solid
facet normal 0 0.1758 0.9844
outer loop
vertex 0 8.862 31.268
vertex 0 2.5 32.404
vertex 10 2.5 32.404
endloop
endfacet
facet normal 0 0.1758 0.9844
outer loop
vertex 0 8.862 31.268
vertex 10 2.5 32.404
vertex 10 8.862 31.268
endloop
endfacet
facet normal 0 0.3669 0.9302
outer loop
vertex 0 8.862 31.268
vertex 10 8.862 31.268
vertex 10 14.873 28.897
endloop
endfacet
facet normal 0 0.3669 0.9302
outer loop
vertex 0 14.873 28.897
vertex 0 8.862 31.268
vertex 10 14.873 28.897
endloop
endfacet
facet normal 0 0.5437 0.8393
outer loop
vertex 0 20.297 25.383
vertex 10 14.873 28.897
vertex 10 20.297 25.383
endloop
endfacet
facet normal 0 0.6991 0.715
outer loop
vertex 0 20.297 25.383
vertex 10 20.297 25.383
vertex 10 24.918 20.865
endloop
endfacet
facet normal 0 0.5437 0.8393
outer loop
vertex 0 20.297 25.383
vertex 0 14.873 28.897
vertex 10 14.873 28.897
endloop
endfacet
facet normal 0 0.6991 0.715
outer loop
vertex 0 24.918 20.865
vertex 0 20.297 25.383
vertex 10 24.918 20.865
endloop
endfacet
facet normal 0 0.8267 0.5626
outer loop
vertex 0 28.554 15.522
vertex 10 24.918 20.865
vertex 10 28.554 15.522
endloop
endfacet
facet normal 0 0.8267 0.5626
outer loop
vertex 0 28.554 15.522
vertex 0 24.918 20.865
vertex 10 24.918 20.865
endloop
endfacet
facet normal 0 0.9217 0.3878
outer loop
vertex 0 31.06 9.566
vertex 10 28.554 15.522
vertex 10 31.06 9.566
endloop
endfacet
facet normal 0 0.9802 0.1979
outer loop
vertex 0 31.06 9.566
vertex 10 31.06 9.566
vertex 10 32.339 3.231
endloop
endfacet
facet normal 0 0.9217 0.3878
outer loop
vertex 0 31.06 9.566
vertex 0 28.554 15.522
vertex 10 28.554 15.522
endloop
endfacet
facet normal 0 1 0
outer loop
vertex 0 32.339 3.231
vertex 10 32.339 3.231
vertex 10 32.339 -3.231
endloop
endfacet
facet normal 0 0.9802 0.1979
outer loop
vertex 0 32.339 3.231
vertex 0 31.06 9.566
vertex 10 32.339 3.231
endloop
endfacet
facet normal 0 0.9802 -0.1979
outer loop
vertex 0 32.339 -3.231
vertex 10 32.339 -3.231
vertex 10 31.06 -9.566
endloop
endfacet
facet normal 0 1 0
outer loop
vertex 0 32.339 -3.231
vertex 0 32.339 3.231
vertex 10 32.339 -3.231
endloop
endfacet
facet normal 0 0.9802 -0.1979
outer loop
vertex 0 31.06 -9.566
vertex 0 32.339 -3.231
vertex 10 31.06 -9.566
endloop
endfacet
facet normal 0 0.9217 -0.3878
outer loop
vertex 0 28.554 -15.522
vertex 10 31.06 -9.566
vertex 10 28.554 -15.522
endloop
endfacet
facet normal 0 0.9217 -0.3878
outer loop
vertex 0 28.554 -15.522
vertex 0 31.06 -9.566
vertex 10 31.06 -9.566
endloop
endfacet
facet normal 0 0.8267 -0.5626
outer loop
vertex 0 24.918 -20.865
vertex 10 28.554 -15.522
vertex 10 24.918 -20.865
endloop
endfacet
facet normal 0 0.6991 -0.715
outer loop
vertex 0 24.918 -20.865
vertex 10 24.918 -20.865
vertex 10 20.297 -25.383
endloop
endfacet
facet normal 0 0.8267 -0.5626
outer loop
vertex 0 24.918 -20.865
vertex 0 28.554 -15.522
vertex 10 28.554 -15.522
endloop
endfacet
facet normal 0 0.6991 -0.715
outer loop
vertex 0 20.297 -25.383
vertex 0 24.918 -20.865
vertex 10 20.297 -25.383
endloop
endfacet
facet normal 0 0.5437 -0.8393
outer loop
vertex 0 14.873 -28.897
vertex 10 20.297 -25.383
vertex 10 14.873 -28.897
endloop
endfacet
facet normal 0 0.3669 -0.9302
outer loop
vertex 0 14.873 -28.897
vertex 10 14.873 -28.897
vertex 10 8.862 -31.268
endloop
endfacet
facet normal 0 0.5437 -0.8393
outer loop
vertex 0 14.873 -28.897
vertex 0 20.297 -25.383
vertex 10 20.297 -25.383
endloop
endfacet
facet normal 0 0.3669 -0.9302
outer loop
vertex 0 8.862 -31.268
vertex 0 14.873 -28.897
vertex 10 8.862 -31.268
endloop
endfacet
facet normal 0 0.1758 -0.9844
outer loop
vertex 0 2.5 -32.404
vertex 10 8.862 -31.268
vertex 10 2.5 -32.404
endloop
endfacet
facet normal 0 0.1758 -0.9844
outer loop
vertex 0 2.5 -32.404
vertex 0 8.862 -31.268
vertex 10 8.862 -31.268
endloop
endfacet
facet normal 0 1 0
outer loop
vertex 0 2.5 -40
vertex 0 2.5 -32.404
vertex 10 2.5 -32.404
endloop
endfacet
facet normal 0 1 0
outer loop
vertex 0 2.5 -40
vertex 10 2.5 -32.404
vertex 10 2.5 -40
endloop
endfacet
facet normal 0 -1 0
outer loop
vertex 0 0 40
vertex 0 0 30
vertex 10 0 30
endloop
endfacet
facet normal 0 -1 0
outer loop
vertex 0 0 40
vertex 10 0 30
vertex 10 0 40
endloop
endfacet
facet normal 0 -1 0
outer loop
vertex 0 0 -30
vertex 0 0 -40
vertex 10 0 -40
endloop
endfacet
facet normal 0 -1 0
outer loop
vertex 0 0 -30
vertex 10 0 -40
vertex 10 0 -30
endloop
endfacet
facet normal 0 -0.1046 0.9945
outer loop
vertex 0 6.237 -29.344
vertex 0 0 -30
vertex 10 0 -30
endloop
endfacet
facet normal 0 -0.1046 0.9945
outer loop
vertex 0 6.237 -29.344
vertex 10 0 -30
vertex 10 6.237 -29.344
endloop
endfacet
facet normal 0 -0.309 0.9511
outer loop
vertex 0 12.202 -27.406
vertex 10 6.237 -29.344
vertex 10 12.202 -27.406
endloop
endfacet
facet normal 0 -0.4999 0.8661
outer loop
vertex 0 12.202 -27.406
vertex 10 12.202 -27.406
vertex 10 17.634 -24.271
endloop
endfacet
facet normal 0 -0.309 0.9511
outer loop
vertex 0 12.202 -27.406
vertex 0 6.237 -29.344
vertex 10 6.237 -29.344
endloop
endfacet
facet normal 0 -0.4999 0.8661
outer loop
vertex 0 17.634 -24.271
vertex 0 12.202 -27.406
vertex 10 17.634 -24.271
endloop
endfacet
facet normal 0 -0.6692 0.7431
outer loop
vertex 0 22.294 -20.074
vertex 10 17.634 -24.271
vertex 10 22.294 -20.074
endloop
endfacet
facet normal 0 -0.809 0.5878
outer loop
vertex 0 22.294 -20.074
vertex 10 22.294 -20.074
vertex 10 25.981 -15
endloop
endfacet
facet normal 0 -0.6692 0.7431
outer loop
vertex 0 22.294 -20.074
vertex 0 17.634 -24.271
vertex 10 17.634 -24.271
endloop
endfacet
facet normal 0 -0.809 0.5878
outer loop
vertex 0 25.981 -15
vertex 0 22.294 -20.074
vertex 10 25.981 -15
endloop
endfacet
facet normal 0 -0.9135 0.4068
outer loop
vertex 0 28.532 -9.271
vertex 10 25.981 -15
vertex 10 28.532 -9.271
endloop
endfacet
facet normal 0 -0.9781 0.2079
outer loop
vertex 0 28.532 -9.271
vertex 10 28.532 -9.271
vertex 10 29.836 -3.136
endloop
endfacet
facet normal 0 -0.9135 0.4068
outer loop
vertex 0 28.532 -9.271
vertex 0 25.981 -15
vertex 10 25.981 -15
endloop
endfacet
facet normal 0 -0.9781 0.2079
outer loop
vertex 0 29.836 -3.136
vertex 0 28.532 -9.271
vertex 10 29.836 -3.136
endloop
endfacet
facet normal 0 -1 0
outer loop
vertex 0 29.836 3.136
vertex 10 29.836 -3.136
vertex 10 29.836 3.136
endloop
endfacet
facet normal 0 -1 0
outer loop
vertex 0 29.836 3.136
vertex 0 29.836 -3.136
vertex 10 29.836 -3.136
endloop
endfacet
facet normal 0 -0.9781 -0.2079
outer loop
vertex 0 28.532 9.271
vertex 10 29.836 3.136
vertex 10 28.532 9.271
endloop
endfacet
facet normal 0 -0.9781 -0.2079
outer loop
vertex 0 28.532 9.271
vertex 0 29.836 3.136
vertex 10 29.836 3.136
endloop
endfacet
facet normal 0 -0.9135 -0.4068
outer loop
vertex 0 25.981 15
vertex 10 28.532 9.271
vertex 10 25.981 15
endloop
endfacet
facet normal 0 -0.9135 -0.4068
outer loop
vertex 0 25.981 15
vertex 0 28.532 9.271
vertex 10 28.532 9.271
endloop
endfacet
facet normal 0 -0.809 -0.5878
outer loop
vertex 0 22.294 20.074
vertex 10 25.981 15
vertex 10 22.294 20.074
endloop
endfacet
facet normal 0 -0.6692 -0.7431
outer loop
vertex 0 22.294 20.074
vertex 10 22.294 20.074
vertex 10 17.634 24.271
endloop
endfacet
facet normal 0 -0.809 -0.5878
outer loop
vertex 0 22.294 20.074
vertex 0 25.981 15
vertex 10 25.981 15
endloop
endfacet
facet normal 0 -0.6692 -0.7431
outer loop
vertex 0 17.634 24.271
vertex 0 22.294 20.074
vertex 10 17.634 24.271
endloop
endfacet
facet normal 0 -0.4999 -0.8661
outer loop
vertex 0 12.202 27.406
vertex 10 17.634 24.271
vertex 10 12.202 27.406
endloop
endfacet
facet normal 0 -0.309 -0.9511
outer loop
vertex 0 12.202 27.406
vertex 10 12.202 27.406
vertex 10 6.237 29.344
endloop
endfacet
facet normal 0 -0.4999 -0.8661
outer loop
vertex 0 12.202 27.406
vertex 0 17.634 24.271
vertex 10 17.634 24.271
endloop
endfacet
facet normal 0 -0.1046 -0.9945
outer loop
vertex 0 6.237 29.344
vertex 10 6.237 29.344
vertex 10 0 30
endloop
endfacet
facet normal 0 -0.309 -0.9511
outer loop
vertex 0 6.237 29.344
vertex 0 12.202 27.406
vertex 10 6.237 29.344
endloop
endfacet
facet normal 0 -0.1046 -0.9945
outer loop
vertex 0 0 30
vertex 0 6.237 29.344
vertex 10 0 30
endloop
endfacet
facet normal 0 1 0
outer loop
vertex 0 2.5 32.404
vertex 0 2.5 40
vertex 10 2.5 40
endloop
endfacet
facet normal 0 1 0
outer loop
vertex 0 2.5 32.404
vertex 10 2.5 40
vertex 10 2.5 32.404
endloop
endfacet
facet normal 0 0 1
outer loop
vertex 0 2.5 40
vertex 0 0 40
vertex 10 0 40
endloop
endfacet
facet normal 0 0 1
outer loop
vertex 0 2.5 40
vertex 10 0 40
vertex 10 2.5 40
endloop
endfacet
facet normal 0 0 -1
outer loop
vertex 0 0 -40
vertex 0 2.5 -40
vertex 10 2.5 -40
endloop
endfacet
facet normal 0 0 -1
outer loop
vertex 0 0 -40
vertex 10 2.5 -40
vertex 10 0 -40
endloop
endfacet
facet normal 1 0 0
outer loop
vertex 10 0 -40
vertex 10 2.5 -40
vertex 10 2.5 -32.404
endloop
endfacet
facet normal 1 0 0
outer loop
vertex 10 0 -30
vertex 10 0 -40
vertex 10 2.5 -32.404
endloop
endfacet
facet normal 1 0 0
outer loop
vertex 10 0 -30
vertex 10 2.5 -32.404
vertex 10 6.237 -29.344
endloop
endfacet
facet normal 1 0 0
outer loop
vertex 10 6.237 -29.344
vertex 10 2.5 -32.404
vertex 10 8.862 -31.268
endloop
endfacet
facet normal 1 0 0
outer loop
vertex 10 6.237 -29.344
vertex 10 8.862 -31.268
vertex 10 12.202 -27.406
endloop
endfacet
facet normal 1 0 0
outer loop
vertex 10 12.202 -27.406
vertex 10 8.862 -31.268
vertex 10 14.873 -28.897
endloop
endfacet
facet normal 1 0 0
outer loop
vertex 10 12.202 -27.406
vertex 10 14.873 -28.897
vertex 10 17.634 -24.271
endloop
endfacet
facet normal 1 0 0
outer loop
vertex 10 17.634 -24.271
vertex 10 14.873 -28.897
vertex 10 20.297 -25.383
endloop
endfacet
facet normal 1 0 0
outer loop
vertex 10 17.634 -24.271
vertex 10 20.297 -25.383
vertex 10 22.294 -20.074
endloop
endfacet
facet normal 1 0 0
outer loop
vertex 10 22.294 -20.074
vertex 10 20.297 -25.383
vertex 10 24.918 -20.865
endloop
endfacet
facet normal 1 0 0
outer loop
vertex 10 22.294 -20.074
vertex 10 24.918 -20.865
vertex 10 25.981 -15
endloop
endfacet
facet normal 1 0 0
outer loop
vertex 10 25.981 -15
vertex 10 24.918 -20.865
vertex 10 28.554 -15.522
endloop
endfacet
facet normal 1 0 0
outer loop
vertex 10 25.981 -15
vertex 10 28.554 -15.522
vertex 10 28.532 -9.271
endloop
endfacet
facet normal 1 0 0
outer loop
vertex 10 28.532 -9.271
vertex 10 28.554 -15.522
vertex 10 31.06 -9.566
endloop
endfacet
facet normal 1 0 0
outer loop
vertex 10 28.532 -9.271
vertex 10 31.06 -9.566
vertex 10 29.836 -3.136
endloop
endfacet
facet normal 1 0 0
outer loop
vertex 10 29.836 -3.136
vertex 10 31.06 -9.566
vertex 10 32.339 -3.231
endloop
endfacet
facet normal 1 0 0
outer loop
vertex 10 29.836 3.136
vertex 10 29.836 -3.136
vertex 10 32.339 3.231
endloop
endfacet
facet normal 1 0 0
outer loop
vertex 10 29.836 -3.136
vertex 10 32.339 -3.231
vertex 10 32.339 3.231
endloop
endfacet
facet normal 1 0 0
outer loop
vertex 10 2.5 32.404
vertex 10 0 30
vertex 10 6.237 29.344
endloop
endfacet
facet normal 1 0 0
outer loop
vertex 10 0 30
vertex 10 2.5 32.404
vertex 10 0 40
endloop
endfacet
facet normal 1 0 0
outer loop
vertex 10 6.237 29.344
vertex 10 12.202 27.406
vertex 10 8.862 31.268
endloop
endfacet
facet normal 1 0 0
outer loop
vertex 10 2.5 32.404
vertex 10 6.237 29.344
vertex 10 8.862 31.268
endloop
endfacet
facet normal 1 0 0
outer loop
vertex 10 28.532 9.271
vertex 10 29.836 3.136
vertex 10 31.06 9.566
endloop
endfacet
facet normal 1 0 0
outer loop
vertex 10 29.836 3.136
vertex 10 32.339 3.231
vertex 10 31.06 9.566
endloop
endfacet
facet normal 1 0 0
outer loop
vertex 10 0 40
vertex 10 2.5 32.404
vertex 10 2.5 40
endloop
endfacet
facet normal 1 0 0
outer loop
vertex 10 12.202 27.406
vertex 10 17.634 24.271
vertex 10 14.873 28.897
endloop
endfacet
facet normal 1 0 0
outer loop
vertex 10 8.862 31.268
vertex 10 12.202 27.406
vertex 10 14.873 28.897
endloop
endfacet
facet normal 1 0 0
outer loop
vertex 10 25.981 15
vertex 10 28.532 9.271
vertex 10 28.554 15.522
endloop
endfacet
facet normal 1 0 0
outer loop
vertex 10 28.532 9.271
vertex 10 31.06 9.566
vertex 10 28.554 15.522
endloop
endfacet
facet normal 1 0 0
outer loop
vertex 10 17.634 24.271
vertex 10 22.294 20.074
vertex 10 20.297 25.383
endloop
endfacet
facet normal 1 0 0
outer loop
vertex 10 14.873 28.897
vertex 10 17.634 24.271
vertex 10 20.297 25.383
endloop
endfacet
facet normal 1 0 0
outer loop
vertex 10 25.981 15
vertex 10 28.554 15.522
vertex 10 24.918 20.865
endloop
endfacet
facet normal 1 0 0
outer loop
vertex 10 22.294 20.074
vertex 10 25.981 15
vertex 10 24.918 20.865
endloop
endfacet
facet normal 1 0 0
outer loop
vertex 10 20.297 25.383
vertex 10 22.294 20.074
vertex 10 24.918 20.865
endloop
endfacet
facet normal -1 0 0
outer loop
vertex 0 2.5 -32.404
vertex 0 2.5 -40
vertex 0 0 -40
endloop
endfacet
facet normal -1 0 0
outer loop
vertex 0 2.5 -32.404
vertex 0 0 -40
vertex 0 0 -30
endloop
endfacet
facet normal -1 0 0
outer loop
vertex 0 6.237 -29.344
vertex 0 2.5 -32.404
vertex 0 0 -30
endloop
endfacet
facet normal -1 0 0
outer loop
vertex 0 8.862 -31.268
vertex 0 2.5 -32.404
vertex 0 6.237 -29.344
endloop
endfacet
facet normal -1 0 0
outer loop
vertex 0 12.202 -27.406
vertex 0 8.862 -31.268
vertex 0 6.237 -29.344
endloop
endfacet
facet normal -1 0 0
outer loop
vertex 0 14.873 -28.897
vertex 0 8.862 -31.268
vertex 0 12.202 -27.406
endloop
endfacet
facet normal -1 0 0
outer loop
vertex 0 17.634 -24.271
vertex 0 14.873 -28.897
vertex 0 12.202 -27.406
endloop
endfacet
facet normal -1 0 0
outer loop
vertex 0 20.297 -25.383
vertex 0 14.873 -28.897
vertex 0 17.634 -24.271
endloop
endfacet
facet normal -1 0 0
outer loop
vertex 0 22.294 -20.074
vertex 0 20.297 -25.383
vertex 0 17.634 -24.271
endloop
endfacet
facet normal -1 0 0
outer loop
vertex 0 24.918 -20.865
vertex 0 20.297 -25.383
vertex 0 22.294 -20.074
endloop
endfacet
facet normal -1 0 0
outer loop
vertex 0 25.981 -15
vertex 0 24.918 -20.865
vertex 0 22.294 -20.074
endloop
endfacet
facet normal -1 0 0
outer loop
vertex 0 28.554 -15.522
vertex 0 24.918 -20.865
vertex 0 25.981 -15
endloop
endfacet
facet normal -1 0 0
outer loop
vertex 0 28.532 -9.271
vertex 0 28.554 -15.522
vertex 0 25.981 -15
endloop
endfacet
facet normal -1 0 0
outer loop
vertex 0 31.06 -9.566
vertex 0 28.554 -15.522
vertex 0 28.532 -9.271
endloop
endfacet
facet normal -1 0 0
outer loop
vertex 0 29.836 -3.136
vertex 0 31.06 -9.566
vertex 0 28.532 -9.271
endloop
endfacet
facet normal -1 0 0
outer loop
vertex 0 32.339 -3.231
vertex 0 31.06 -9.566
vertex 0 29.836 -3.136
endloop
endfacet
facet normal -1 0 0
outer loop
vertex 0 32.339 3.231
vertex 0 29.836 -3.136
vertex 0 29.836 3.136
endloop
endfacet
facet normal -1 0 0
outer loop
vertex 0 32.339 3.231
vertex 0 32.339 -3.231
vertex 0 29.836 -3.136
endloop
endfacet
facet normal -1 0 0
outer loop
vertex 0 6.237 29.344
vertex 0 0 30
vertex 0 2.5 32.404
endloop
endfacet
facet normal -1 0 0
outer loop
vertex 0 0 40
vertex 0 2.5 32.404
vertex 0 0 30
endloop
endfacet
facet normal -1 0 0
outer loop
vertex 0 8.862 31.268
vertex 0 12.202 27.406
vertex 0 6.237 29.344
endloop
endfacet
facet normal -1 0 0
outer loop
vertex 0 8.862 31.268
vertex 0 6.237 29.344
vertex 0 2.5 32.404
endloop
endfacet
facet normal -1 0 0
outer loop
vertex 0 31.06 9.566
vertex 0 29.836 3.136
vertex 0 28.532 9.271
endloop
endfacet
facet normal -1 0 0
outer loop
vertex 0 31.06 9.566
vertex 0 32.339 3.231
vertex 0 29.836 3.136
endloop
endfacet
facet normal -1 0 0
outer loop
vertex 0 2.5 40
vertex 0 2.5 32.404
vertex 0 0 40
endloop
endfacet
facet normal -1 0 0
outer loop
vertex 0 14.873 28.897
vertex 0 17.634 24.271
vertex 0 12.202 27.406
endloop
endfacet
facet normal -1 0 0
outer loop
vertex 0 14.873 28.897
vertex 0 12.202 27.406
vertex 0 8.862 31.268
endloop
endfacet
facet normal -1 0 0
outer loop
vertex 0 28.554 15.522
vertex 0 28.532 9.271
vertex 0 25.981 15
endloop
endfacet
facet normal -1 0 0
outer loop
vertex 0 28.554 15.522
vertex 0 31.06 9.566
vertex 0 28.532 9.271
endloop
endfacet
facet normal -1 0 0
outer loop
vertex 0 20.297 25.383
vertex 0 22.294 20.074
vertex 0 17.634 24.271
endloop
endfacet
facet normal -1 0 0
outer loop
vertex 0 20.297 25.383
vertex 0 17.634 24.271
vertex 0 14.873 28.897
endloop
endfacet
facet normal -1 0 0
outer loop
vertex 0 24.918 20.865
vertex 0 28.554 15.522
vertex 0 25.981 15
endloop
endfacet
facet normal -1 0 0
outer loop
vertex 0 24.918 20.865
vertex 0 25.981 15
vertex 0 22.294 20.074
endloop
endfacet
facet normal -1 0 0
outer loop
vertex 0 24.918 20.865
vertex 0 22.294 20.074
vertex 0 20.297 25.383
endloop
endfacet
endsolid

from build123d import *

# Parameters (mm, degrees)
BOSS_EXTRUDE1_DEPTH = 10


with BuildPart() as part:
    # Sketch1 → Boss-Extrude1 (new body)
    with BuildSketch(Plane(origin=(0, 0, 0), x_dir=(0, 0, -1), z_dir=(1, 0, 0))):
        with BuildLine():
            Line((-30, 0), (-40, 0))
            Line((-40, 0), (-40, 2.5))
            Line((-40, 2.5), (-32.403703492, 2.5))
            ThreePointArc((-32.403703492, 2.5), (0, 32.5), (32.403703492, 2.5))
            Line((32.403703492, 2.5), (40, 2.5))
            Line((40, 2.5), (40, 0))
            Line((40, 0), (30, 0))
            ThreePointArc((30, 0), (0, 30), (-30, 0))
        make_face()
    extrude(amount=BOSS_EXTRUDE1_DEPTH)


solid = part.part
